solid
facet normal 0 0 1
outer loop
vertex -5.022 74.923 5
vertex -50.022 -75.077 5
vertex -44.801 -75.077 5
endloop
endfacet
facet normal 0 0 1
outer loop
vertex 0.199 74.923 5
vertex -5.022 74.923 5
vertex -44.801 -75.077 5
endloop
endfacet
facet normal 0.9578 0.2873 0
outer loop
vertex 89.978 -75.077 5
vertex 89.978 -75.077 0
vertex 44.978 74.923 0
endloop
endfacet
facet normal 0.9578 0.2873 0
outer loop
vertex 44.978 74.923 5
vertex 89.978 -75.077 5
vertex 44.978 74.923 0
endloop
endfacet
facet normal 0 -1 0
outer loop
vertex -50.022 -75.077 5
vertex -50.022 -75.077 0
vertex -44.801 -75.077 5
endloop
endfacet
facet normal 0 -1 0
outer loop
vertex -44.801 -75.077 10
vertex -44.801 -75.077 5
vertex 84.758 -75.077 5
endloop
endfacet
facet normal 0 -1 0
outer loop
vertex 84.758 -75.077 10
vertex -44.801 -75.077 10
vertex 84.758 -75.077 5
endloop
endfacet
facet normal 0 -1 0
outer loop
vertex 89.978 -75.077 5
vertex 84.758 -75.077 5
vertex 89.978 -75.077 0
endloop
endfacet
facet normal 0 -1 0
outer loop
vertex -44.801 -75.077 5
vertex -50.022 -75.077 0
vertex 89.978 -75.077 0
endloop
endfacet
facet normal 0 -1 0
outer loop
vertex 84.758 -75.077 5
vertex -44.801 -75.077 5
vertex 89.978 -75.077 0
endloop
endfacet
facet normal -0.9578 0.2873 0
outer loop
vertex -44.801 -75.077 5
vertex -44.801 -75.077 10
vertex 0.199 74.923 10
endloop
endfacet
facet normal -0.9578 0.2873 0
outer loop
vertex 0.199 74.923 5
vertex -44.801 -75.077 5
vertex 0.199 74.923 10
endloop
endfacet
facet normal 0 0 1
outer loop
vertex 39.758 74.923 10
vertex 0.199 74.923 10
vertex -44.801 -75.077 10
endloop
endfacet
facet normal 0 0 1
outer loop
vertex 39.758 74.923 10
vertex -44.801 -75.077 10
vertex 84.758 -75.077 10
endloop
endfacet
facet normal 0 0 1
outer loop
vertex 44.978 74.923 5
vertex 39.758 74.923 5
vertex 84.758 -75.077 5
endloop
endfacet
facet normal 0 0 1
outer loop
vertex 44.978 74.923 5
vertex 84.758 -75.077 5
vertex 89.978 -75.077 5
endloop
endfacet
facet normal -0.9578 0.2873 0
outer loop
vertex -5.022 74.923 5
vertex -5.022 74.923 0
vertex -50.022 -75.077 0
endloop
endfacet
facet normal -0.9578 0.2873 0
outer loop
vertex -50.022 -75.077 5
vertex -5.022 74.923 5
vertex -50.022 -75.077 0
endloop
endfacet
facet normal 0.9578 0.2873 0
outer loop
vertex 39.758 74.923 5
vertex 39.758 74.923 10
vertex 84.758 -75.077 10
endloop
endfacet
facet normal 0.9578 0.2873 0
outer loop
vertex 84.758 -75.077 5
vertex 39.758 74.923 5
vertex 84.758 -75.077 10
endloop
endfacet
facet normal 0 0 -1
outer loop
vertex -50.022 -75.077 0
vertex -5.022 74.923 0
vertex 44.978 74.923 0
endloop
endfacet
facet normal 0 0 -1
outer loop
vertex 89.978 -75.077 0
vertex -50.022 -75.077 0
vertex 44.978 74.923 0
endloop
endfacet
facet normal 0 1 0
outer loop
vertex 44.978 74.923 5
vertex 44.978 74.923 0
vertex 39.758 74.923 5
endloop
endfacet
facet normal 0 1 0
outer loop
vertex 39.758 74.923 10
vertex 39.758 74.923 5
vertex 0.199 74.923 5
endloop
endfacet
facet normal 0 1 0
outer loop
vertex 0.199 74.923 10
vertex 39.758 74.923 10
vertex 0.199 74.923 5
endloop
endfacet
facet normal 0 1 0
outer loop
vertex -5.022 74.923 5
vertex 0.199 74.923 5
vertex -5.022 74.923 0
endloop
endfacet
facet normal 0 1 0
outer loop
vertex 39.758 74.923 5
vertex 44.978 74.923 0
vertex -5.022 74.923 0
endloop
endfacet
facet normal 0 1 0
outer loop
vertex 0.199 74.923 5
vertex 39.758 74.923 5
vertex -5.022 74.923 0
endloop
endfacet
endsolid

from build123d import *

# Parameters (mm, degrees)
F1_DEPTH = 10
F3_DEPTH = 5
F4_DEPTH = 5


with BuildPart() as f1:
    # F0 (on Top) → F1 (new body)
    with BuildSketch(Plane.XY):
        Polygon((44.978361, 74.922603), (-5.021639, 74.922603), (-50.021639, -75.077397), (-5.021639, -75.077397), (44.978361, -75.077397), (89.978361, -75.077397), align=None)
    extrude(amount=F1_DEPTH)

    # F2 (on face) → F3 (cut)
    with BuildSketch(Plane.XY.offset(10)):
        Polygon((44.978361, 74.922603), (39.758208, 74.922603), (84.758208, -75.077397), (89.978361, -75.077397), align=None)
        Polygon((-44.801485, -75.077397), (0.198515, 74.922603), (-5.021639, 74.922603), (-50.021639, -75.077397), align=None)
    extrude(amount=-F3_DEPTH, mode=Mode.SUBTRACT)

    # F2 (on face) → F4 (cut)
    with BuildSketch(Plane.XY.offset(10)):
        Polygon((44.978361, 74.922603), (39.758208, 74.922603), (84.758208, -75.077397), (89.978361, -75.077397), align=None)
        Polygon((-44.801485, -75.077397), (0.198515, 74.922603), (-5.021639, 74.922603), (-50.021639, -75.077397), align=None)
    extrude(amount=-F4_DEPTH, mode=Mode.SUBTRACT)


solid = f1.part
